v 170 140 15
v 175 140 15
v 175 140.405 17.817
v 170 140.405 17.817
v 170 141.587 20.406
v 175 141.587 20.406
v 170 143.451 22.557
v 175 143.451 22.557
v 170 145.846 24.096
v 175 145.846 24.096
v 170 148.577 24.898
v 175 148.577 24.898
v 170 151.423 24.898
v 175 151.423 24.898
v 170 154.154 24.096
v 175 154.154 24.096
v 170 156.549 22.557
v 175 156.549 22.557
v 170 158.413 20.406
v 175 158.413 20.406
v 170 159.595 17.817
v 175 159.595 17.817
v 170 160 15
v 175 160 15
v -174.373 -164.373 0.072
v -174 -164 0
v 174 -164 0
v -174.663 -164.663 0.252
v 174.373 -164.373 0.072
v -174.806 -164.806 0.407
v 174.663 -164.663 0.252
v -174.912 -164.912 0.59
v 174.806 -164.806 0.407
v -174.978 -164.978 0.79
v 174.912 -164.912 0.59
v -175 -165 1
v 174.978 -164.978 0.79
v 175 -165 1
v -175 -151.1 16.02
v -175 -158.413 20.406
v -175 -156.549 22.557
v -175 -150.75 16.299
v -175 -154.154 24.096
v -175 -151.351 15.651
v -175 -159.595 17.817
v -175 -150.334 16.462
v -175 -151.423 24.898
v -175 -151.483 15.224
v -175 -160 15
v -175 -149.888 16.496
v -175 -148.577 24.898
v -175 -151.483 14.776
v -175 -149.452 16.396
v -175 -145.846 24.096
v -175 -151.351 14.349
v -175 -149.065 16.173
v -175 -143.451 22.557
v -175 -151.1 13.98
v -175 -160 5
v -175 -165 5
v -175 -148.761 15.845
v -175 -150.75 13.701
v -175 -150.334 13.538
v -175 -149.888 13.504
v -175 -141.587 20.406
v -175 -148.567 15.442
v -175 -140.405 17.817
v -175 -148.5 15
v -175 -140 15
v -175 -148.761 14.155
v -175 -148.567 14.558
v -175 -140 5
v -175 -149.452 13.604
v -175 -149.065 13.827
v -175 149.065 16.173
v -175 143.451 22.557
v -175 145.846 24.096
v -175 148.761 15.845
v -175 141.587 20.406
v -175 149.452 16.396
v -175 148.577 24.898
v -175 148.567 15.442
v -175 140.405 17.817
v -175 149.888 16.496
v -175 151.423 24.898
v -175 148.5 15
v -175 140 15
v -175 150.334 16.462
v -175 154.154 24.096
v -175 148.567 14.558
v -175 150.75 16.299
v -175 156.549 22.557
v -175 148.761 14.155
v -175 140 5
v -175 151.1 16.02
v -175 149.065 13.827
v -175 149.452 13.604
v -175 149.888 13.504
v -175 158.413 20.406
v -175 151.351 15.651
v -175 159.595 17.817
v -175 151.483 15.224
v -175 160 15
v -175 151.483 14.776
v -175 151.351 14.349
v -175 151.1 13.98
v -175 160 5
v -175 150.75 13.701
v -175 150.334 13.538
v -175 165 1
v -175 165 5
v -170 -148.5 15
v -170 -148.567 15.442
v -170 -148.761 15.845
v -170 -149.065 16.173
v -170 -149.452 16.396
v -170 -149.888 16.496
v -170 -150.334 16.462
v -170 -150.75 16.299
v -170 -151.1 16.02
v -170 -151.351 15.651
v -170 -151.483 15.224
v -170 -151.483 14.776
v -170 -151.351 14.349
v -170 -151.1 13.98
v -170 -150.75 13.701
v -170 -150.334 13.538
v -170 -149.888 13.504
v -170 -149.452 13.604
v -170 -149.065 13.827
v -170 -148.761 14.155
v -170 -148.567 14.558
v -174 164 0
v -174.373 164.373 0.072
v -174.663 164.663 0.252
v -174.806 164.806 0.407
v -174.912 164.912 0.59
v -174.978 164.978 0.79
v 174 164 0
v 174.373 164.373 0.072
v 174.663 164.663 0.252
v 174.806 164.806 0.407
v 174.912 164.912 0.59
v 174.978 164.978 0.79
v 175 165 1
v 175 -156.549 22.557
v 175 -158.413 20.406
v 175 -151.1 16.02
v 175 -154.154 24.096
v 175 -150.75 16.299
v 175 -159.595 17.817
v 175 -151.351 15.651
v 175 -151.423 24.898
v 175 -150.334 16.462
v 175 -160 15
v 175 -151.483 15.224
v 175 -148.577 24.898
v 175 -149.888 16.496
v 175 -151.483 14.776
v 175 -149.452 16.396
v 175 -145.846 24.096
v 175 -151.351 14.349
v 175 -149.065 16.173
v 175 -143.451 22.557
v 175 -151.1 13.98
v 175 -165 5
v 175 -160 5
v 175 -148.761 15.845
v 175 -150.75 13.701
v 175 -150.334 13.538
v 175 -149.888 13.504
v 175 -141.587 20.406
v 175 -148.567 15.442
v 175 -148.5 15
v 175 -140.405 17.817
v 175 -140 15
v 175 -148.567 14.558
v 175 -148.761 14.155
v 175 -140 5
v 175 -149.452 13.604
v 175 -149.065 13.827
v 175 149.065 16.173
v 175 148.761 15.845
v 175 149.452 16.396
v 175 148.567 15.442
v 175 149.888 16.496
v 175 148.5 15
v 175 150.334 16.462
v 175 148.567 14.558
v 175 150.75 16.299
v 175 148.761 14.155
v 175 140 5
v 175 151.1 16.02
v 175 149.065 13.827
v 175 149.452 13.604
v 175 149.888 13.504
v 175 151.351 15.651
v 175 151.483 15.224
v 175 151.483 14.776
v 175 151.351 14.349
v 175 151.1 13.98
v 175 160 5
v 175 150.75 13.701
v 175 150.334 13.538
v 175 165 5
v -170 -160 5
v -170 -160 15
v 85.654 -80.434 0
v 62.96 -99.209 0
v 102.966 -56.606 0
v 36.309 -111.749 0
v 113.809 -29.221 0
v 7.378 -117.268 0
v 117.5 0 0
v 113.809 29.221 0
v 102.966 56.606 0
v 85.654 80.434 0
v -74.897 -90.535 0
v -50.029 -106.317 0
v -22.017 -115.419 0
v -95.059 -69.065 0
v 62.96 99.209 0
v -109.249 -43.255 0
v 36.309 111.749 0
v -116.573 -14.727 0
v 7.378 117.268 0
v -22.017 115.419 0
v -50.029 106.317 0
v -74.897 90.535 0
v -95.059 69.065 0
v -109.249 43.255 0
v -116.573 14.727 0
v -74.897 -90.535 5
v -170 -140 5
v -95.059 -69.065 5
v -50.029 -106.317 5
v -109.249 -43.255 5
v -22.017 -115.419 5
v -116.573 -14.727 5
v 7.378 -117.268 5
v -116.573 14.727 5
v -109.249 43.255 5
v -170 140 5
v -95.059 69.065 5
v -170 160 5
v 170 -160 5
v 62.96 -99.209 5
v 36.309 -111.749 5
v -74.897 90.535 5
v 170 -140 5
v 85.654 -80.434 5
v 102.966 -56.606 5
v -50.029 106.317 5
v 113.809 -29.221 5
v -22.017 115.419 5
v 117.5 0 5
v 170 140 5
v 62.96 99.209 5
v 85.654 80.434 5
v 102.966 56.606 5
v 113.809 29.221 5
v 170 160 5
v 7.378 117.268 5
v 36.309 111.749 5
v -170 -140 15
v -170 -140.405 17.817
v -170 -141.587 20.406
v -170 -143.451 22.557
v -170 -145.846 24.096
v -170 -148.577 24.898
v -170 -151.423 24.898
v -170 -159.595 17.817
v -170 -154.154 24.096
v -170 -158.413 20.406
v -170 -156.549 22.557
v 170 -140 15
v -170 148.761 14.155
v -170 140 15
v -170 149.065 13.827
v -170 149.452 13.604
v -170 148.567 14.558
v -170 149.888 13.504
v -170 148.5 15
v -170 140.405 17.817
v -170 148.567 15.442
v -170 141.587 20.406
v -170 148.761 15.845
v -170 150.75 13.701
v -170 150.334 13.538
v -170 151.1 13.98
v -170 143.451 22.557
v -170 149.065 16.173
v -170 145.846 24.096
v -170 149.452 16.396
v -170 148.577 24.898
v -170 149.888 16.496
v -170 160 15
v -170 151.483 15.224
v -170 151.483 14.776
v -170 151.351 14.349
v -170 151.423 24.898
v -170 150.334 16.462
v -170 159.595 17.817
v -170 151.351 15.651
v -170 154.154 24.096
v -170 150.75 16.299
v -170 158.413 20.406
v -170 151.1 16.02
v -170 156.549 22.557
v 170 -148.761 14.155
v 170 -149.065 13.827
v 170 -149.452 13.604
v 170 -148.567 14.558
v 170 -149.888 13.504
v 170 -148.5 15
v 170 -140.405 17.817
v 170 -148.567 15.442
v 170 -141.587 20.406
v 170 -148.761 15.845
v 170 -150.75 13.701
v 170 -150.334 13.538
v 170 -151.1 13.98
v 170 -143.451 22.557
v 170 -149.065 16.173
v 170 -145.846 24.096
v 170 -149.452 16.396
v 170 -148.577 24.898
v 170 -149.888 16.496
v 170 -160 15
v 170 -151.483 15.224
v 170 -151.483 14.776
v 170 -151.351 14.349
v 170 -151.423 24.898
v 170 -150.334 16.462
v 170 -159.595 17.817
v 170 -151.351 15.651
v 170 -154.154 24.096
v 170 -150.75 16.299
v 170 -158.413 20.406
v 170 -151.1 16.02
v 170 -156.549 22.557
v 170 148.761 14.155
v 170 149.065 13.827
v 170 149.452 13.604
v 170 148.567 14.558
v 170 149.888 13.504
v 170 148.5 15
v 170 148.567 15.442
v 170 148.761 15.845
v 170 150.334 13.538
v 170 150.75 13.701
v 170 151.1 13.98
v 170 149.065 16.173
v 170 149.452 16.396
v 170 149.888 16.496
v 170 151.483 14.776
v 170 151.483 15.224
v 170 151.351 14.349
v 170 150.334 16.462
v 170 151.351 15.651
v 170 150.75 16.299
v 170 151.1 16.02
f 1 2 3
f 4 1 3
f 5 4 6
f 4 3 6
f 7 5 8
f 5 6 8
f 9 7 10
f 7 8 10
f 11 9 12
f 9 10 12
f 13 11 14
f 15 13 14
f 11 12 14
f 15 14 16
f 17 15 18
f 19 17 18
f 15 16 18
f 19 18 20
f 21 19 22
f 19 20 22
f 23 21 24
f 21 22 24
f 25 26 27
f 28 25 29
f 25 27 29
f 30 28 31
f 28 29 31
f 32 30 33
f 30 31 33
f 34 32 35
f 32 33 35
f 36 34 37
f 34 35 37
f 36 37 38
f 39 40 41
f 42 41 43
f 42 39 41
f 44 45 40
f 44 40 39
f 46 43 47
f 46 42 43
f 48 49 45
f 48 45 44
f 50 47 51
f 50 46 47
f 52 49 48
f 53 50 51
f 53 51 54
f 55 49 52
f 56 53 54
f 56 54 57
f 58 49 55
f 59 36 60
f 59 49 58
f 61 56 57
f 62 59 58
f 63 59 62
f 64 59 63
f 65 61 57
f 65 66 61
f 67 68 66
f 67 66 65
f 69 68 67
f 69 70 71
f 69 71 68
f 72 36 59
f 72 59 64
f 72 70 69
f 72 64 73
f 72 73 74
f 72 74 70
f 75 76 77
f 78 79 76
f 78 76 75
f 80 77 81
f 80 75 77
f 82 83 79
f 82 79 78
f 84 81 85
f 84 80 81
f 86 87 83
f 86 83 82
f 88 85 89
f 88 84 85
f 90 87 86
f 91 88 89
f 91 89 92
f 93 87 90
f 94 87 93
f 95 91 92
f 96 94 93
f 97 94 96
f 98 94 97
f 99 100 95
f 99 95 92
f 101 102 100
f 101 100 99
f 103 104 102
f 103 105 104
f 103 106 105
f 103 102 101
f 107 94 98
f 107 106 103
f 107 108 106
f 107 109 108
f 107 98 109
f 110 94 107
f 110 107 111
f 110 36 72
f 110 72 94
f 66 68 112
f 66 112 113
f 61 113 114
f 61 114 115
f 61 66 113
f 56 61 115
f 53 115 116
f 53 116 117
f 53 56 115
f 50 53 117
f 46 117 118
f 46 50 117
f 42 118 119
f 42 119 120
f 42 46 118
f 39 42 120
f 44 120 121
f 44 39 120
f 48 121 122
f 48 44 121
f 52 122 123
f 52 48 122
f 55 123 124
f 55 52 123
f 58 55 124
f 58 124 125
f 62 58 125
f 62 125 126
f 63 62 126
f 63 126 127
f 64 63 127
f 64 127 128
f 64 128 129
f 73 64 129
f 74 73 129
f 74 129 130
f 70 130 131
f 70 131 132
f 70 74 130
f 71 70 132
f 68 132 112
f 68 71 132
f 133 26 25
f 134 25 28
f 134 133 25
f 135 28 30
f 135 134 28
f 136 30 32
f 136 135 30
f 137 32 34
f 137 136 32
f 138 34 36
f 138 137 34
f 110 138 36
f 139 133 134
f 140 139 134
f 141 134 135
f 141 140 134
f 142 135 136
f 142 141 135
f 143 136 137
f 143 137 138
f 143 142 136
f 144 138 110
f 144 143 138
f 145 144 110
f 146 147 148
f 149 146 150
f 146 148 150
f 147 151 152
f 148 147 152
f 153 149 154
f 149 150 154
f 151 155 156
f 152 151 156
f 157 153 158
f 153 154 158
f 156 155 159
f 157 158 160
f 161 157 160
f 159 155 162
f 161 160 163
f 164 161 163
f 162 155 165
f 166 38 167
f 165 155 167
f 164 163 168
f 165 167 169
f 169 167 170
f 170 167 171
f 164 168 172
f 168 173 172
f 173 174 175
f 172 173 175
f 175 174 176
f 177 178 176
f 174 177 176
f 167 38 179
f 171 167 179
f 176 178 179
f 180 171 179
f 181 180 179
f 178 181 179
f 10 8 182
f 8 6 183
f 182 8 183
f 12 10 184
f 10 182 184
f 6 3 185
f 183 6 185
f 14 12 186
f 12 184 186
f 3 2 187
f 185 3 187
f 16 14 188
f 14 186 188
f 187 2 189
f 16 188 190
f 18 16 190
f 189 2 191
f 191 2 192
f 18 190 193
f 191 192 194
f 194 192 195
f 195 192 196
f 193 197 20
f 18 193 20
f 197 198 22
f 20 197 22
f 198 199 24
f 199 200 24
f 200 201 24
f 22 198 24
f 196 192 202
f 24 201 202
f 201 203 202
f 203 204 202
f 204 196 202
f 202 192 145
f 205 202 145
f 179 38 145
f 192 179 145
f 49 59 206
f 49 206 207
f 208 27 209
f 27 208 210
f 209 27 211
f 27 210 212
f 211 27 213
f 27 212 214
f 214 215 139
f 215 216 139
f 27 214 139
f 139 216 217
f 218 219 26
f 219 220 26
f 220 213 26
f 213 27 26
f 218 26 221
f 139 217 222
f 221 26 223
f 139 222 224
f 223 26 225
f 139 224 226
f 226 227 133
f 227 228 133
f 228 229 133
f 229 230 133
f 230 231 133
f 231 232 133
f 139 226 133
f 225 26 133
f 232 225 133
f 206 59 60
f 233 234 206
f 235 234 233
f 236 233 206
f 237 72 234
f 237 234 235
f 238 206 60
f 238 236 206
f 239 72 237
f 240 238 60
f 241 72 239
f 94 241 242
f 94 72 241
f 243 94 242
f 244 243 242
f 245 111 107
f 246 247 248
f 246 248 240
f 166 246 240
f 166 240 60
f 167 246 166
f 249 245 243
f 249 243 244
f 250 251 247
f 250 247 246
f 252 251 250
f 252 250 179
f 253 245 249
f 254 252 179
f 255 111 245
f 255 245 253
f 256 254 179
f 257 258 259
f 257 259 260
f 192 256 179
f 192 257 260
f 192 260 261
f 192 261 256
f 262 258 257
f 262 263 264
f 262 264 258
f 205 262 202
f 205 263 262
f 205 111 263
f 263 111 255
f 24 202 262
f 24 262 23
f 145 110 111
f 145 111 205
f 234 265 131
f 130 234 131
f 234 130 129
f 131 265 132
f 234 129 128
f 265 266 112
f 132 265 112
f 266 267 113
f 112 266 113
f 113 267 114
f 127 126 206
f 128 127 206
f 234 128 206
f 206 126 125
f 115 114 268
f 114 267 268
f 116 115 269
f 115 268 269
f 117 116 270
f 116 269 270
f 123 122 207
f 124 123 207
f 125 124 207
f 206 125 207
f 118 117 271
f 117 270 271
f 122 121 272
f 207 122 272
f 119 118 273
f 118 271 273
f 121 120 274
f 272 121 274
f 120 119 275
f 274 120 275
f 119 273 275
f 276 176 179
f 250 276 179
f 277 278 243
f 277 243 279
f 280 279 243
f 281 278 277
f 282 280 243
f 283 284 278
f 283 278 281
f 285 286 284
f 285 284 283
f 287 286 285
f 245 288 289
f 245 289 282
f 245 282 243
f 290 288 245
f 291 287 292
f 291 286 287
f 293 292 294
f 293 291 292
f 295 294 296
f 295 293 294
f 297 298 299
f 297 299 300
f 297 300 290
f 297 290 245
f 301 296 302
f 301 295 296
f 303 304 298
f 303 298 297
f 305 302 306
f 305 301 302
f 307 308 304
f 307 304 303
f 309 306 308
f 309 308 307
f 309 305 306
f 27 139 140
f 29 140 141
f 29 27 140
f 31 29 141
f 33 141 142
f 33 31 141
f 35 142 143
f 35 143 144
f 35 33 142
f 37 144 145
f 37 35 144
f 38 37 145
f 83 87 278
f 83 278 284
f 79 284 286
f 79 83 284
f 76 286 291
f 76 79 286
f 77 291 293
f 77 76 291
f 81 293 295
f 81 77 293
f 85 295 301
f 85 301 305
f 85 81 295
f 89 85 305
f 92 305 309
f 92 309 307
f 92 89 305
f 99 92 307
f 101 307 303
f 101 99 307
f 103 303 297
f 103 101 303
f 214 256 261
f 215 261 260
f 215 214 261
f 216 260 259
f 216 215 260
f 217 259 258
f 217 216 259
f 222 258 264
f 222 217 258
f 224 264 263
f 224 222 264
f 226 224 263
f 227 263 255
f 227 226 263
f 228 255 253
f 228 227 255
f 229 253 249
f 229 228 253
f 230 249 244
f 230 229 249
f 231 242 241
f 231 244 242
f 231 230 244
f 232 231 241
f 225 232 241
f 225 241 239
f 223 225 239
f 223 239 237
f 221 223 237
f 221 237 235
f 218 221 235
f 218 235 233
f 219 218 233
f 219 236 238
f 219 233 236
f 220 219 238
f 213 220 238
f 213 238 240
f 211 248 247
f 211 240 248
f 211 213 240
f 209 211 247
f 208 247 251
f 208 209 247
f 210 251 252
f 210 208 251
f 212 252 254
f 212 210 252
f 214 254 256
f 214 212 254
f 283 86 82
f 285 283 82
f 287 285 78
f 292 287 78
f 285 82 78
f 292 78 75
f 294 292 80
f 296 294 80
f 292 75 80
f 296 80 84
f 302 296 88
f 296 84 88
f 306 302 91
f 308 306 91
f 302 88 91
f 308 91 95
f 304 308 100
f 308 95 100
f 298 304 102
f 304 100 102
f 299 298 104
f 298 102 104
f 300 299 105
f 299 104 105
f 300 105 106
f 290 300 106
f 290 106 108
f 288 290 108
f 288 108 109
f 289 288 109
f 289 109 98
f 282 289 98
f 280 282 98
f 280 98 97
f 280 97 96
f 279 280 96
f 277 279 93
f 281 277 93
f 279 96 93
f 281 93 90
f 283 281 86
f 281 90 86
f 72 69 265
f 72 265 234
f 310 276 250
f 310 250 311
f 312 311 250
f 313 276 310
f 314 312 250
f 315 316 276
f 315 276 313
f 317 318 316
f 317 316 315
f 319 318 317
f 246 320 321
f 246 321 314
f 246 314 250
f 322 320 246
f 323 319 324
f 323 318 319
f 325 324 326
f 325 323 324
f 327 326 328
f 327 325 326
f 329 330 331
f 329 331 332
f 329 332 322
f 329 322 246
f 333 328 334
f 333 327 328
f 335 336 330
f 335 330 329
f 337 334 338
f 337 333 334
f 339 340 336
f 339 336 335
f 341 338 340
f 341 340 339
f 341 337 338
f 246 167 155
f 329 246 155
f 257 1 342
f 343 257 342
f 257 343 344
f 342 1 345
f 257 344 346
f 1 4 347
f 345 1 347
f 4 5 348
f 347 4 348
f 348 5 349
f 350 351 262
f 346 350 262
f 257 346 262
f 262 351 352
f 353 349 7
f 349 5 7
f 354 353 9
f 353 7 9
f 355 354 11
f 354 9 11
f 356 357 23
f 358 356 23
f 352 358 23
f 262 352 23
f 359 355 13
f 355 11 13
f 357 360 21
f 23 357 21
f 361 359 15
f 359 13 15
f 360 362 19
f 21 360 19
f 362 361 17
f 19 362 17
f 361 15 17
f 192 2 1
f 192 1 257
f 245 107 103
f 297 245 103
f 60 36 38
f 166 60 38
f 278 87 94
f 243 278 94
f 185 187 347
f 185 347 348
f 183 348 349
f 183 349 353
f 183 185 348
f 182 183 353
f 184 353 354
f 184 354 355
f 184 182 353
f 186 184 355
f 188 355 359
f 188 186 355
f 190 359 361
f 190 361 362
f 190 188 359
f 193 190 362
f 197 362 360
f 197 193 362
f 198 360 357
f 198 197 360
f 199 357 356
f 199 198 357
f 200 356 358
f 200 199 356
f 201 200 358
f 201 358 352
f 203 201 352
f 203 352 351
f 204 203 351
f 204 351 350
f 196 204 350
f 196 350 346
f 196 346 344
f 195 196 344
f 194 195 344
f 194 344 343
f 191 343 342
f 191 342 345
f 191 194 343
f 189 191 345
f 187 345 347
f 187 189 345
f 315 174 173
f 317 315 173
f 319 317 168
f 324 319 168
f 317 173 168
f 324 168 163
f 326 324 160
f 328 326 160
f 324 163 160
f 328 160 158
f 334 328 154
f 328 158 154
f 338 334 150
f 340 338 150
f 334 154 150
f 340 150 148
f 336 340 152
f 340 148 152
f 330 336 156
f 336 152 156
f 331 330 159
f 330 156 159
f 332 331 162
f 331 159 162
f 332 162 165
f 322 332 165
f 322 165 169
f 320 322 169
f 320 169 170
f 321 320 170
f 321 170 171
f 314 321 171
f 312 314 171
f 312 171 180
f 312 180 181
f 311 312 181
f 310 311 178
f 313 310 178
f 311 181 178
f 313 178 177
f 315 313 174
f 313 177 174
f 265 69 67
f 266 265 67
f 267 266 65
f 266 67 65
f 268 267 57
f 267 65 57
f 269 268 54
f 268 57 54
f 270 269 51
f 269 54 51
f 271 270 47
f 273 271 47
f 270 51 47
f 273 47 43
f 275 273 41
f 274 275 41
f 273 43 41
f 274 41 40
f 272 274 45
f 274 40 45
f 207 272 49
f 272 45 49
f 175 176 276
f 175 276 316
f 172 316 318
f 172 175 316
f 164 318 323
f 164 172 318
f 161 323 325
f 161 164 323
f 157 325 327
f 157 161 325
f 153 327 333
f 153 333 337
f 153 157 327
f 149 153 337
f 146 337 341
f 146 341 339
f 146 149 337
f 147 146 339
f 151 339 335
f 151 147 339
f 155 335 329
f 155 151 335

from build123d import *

# Parameters (mm, degrees)
SKETCH010_W           = 350
SKETCH010_H           = 330
PAD002_DEPTH          = 5
PAD003_DEPTH          = 5
SKETCH012_R           = 1.5
POCKET004_DEPTH       = 5
POLARPATTERN_COUNT    = 2
POLARPATTERN001_COUNT = 2
FILLET004_R           = 1
SKETCH013_R           = 117.5
POCKET005_DEPTH       = 10


with BuildPart() as part:
    # Sketch010 → Pad002 (new body)
    with BuildSketch(Plane.XY):
        Rectangle(SKETCH010_W, SKETCH010_H)
    extrude(amount=PAD002_DEPTH)

    # Sketch011 → Pad003 (join)
    with BuildSketch(Plane.YZ.offset(175)):
        with BuildLine():
            Line((-160, 0), (-160, 15))
            ThreePointArc((-140, 15), (-150, 25), (-160, 15))
            Line((-140, 15), (-140, 0))
            Line((-140, 0), (-160, 0))
        make_face()
    pad003 = extrude(amount=-PAD003_DEPTH)

    # Sketch012 → Pocket004 (cut)
    with BuildSketch(Plane.YZ.offset(175)):
        with Locations((-150, 15)):
            Circle(SKETCH012_R)
    pocket004 = extrude(amount=-POCKET004_DEPTH, mode=Mode.SUBTRACT)

    # Mirrored: Pad003 across Sketch011 V_Axis
    add(pad003.mirror(Plane(origin=(175, 0, 0), x_dir=(1, 0, 0), z_dir=(0, 1, 0))))

    # Mirrored001: Pocket004 across Sketch012 V_Axis
    add(pocket004.mirror(Plane(origin=(175, 0, 0), x_dir=(1, 0, 0), z_dir=(0, 1, 0))), mode=Mode.SUBTRACT)

    # Mirrored002: Pad003 across YZ
    add(pad003.mirror(Plane.YZ))

    # Mirrored003: Pocket004 across YZ
    add(pocket004.mirror(Plane.YZ), mode=Mode.SUBTRACT)

    # PolarPattern: Pad003 ×2 about axis
    polarpattern_axis = Axis((0, 0, 0), (0, 0, 1))
    for i in range(1, POLARPATTERN_COUNT):
        add(pad003.rotate(polarpattern_axis, i * 360 / POLARPATTERN_COUNT))

    # PolarPattern001: Pocket004 ×2 about axis
    polarpattern001_axis = Axis((0, 0, 0), (0, 0, 1))
    for i in range(1, POLARPATTERN001_COUNT):
        add(pocket004.rotate(polarpattern001_axis, i * 360 / POLARPATTERN001_COUNT), mode=Mode.SUBTRACT)

    # Fillet004
    fillet004_edges = [part.edges().sort_by_distance(p)[0] for p in [
        (0, 165, 0),
        (175, 0, 0),
        (0, -165, 0),
        (-175, 0, 0),
    ]]
    fillet(fillet004_edges, radius=FILLET004_R)

    # Sketch013 → Pocket005 (cut)
    with BuildSketch(Plane.XY):
        Circle(SKETCH013_R)
    extrude(amount=POCKET005_DEPTH, mode=Mode.SUBTRACT)


solid = part.part
